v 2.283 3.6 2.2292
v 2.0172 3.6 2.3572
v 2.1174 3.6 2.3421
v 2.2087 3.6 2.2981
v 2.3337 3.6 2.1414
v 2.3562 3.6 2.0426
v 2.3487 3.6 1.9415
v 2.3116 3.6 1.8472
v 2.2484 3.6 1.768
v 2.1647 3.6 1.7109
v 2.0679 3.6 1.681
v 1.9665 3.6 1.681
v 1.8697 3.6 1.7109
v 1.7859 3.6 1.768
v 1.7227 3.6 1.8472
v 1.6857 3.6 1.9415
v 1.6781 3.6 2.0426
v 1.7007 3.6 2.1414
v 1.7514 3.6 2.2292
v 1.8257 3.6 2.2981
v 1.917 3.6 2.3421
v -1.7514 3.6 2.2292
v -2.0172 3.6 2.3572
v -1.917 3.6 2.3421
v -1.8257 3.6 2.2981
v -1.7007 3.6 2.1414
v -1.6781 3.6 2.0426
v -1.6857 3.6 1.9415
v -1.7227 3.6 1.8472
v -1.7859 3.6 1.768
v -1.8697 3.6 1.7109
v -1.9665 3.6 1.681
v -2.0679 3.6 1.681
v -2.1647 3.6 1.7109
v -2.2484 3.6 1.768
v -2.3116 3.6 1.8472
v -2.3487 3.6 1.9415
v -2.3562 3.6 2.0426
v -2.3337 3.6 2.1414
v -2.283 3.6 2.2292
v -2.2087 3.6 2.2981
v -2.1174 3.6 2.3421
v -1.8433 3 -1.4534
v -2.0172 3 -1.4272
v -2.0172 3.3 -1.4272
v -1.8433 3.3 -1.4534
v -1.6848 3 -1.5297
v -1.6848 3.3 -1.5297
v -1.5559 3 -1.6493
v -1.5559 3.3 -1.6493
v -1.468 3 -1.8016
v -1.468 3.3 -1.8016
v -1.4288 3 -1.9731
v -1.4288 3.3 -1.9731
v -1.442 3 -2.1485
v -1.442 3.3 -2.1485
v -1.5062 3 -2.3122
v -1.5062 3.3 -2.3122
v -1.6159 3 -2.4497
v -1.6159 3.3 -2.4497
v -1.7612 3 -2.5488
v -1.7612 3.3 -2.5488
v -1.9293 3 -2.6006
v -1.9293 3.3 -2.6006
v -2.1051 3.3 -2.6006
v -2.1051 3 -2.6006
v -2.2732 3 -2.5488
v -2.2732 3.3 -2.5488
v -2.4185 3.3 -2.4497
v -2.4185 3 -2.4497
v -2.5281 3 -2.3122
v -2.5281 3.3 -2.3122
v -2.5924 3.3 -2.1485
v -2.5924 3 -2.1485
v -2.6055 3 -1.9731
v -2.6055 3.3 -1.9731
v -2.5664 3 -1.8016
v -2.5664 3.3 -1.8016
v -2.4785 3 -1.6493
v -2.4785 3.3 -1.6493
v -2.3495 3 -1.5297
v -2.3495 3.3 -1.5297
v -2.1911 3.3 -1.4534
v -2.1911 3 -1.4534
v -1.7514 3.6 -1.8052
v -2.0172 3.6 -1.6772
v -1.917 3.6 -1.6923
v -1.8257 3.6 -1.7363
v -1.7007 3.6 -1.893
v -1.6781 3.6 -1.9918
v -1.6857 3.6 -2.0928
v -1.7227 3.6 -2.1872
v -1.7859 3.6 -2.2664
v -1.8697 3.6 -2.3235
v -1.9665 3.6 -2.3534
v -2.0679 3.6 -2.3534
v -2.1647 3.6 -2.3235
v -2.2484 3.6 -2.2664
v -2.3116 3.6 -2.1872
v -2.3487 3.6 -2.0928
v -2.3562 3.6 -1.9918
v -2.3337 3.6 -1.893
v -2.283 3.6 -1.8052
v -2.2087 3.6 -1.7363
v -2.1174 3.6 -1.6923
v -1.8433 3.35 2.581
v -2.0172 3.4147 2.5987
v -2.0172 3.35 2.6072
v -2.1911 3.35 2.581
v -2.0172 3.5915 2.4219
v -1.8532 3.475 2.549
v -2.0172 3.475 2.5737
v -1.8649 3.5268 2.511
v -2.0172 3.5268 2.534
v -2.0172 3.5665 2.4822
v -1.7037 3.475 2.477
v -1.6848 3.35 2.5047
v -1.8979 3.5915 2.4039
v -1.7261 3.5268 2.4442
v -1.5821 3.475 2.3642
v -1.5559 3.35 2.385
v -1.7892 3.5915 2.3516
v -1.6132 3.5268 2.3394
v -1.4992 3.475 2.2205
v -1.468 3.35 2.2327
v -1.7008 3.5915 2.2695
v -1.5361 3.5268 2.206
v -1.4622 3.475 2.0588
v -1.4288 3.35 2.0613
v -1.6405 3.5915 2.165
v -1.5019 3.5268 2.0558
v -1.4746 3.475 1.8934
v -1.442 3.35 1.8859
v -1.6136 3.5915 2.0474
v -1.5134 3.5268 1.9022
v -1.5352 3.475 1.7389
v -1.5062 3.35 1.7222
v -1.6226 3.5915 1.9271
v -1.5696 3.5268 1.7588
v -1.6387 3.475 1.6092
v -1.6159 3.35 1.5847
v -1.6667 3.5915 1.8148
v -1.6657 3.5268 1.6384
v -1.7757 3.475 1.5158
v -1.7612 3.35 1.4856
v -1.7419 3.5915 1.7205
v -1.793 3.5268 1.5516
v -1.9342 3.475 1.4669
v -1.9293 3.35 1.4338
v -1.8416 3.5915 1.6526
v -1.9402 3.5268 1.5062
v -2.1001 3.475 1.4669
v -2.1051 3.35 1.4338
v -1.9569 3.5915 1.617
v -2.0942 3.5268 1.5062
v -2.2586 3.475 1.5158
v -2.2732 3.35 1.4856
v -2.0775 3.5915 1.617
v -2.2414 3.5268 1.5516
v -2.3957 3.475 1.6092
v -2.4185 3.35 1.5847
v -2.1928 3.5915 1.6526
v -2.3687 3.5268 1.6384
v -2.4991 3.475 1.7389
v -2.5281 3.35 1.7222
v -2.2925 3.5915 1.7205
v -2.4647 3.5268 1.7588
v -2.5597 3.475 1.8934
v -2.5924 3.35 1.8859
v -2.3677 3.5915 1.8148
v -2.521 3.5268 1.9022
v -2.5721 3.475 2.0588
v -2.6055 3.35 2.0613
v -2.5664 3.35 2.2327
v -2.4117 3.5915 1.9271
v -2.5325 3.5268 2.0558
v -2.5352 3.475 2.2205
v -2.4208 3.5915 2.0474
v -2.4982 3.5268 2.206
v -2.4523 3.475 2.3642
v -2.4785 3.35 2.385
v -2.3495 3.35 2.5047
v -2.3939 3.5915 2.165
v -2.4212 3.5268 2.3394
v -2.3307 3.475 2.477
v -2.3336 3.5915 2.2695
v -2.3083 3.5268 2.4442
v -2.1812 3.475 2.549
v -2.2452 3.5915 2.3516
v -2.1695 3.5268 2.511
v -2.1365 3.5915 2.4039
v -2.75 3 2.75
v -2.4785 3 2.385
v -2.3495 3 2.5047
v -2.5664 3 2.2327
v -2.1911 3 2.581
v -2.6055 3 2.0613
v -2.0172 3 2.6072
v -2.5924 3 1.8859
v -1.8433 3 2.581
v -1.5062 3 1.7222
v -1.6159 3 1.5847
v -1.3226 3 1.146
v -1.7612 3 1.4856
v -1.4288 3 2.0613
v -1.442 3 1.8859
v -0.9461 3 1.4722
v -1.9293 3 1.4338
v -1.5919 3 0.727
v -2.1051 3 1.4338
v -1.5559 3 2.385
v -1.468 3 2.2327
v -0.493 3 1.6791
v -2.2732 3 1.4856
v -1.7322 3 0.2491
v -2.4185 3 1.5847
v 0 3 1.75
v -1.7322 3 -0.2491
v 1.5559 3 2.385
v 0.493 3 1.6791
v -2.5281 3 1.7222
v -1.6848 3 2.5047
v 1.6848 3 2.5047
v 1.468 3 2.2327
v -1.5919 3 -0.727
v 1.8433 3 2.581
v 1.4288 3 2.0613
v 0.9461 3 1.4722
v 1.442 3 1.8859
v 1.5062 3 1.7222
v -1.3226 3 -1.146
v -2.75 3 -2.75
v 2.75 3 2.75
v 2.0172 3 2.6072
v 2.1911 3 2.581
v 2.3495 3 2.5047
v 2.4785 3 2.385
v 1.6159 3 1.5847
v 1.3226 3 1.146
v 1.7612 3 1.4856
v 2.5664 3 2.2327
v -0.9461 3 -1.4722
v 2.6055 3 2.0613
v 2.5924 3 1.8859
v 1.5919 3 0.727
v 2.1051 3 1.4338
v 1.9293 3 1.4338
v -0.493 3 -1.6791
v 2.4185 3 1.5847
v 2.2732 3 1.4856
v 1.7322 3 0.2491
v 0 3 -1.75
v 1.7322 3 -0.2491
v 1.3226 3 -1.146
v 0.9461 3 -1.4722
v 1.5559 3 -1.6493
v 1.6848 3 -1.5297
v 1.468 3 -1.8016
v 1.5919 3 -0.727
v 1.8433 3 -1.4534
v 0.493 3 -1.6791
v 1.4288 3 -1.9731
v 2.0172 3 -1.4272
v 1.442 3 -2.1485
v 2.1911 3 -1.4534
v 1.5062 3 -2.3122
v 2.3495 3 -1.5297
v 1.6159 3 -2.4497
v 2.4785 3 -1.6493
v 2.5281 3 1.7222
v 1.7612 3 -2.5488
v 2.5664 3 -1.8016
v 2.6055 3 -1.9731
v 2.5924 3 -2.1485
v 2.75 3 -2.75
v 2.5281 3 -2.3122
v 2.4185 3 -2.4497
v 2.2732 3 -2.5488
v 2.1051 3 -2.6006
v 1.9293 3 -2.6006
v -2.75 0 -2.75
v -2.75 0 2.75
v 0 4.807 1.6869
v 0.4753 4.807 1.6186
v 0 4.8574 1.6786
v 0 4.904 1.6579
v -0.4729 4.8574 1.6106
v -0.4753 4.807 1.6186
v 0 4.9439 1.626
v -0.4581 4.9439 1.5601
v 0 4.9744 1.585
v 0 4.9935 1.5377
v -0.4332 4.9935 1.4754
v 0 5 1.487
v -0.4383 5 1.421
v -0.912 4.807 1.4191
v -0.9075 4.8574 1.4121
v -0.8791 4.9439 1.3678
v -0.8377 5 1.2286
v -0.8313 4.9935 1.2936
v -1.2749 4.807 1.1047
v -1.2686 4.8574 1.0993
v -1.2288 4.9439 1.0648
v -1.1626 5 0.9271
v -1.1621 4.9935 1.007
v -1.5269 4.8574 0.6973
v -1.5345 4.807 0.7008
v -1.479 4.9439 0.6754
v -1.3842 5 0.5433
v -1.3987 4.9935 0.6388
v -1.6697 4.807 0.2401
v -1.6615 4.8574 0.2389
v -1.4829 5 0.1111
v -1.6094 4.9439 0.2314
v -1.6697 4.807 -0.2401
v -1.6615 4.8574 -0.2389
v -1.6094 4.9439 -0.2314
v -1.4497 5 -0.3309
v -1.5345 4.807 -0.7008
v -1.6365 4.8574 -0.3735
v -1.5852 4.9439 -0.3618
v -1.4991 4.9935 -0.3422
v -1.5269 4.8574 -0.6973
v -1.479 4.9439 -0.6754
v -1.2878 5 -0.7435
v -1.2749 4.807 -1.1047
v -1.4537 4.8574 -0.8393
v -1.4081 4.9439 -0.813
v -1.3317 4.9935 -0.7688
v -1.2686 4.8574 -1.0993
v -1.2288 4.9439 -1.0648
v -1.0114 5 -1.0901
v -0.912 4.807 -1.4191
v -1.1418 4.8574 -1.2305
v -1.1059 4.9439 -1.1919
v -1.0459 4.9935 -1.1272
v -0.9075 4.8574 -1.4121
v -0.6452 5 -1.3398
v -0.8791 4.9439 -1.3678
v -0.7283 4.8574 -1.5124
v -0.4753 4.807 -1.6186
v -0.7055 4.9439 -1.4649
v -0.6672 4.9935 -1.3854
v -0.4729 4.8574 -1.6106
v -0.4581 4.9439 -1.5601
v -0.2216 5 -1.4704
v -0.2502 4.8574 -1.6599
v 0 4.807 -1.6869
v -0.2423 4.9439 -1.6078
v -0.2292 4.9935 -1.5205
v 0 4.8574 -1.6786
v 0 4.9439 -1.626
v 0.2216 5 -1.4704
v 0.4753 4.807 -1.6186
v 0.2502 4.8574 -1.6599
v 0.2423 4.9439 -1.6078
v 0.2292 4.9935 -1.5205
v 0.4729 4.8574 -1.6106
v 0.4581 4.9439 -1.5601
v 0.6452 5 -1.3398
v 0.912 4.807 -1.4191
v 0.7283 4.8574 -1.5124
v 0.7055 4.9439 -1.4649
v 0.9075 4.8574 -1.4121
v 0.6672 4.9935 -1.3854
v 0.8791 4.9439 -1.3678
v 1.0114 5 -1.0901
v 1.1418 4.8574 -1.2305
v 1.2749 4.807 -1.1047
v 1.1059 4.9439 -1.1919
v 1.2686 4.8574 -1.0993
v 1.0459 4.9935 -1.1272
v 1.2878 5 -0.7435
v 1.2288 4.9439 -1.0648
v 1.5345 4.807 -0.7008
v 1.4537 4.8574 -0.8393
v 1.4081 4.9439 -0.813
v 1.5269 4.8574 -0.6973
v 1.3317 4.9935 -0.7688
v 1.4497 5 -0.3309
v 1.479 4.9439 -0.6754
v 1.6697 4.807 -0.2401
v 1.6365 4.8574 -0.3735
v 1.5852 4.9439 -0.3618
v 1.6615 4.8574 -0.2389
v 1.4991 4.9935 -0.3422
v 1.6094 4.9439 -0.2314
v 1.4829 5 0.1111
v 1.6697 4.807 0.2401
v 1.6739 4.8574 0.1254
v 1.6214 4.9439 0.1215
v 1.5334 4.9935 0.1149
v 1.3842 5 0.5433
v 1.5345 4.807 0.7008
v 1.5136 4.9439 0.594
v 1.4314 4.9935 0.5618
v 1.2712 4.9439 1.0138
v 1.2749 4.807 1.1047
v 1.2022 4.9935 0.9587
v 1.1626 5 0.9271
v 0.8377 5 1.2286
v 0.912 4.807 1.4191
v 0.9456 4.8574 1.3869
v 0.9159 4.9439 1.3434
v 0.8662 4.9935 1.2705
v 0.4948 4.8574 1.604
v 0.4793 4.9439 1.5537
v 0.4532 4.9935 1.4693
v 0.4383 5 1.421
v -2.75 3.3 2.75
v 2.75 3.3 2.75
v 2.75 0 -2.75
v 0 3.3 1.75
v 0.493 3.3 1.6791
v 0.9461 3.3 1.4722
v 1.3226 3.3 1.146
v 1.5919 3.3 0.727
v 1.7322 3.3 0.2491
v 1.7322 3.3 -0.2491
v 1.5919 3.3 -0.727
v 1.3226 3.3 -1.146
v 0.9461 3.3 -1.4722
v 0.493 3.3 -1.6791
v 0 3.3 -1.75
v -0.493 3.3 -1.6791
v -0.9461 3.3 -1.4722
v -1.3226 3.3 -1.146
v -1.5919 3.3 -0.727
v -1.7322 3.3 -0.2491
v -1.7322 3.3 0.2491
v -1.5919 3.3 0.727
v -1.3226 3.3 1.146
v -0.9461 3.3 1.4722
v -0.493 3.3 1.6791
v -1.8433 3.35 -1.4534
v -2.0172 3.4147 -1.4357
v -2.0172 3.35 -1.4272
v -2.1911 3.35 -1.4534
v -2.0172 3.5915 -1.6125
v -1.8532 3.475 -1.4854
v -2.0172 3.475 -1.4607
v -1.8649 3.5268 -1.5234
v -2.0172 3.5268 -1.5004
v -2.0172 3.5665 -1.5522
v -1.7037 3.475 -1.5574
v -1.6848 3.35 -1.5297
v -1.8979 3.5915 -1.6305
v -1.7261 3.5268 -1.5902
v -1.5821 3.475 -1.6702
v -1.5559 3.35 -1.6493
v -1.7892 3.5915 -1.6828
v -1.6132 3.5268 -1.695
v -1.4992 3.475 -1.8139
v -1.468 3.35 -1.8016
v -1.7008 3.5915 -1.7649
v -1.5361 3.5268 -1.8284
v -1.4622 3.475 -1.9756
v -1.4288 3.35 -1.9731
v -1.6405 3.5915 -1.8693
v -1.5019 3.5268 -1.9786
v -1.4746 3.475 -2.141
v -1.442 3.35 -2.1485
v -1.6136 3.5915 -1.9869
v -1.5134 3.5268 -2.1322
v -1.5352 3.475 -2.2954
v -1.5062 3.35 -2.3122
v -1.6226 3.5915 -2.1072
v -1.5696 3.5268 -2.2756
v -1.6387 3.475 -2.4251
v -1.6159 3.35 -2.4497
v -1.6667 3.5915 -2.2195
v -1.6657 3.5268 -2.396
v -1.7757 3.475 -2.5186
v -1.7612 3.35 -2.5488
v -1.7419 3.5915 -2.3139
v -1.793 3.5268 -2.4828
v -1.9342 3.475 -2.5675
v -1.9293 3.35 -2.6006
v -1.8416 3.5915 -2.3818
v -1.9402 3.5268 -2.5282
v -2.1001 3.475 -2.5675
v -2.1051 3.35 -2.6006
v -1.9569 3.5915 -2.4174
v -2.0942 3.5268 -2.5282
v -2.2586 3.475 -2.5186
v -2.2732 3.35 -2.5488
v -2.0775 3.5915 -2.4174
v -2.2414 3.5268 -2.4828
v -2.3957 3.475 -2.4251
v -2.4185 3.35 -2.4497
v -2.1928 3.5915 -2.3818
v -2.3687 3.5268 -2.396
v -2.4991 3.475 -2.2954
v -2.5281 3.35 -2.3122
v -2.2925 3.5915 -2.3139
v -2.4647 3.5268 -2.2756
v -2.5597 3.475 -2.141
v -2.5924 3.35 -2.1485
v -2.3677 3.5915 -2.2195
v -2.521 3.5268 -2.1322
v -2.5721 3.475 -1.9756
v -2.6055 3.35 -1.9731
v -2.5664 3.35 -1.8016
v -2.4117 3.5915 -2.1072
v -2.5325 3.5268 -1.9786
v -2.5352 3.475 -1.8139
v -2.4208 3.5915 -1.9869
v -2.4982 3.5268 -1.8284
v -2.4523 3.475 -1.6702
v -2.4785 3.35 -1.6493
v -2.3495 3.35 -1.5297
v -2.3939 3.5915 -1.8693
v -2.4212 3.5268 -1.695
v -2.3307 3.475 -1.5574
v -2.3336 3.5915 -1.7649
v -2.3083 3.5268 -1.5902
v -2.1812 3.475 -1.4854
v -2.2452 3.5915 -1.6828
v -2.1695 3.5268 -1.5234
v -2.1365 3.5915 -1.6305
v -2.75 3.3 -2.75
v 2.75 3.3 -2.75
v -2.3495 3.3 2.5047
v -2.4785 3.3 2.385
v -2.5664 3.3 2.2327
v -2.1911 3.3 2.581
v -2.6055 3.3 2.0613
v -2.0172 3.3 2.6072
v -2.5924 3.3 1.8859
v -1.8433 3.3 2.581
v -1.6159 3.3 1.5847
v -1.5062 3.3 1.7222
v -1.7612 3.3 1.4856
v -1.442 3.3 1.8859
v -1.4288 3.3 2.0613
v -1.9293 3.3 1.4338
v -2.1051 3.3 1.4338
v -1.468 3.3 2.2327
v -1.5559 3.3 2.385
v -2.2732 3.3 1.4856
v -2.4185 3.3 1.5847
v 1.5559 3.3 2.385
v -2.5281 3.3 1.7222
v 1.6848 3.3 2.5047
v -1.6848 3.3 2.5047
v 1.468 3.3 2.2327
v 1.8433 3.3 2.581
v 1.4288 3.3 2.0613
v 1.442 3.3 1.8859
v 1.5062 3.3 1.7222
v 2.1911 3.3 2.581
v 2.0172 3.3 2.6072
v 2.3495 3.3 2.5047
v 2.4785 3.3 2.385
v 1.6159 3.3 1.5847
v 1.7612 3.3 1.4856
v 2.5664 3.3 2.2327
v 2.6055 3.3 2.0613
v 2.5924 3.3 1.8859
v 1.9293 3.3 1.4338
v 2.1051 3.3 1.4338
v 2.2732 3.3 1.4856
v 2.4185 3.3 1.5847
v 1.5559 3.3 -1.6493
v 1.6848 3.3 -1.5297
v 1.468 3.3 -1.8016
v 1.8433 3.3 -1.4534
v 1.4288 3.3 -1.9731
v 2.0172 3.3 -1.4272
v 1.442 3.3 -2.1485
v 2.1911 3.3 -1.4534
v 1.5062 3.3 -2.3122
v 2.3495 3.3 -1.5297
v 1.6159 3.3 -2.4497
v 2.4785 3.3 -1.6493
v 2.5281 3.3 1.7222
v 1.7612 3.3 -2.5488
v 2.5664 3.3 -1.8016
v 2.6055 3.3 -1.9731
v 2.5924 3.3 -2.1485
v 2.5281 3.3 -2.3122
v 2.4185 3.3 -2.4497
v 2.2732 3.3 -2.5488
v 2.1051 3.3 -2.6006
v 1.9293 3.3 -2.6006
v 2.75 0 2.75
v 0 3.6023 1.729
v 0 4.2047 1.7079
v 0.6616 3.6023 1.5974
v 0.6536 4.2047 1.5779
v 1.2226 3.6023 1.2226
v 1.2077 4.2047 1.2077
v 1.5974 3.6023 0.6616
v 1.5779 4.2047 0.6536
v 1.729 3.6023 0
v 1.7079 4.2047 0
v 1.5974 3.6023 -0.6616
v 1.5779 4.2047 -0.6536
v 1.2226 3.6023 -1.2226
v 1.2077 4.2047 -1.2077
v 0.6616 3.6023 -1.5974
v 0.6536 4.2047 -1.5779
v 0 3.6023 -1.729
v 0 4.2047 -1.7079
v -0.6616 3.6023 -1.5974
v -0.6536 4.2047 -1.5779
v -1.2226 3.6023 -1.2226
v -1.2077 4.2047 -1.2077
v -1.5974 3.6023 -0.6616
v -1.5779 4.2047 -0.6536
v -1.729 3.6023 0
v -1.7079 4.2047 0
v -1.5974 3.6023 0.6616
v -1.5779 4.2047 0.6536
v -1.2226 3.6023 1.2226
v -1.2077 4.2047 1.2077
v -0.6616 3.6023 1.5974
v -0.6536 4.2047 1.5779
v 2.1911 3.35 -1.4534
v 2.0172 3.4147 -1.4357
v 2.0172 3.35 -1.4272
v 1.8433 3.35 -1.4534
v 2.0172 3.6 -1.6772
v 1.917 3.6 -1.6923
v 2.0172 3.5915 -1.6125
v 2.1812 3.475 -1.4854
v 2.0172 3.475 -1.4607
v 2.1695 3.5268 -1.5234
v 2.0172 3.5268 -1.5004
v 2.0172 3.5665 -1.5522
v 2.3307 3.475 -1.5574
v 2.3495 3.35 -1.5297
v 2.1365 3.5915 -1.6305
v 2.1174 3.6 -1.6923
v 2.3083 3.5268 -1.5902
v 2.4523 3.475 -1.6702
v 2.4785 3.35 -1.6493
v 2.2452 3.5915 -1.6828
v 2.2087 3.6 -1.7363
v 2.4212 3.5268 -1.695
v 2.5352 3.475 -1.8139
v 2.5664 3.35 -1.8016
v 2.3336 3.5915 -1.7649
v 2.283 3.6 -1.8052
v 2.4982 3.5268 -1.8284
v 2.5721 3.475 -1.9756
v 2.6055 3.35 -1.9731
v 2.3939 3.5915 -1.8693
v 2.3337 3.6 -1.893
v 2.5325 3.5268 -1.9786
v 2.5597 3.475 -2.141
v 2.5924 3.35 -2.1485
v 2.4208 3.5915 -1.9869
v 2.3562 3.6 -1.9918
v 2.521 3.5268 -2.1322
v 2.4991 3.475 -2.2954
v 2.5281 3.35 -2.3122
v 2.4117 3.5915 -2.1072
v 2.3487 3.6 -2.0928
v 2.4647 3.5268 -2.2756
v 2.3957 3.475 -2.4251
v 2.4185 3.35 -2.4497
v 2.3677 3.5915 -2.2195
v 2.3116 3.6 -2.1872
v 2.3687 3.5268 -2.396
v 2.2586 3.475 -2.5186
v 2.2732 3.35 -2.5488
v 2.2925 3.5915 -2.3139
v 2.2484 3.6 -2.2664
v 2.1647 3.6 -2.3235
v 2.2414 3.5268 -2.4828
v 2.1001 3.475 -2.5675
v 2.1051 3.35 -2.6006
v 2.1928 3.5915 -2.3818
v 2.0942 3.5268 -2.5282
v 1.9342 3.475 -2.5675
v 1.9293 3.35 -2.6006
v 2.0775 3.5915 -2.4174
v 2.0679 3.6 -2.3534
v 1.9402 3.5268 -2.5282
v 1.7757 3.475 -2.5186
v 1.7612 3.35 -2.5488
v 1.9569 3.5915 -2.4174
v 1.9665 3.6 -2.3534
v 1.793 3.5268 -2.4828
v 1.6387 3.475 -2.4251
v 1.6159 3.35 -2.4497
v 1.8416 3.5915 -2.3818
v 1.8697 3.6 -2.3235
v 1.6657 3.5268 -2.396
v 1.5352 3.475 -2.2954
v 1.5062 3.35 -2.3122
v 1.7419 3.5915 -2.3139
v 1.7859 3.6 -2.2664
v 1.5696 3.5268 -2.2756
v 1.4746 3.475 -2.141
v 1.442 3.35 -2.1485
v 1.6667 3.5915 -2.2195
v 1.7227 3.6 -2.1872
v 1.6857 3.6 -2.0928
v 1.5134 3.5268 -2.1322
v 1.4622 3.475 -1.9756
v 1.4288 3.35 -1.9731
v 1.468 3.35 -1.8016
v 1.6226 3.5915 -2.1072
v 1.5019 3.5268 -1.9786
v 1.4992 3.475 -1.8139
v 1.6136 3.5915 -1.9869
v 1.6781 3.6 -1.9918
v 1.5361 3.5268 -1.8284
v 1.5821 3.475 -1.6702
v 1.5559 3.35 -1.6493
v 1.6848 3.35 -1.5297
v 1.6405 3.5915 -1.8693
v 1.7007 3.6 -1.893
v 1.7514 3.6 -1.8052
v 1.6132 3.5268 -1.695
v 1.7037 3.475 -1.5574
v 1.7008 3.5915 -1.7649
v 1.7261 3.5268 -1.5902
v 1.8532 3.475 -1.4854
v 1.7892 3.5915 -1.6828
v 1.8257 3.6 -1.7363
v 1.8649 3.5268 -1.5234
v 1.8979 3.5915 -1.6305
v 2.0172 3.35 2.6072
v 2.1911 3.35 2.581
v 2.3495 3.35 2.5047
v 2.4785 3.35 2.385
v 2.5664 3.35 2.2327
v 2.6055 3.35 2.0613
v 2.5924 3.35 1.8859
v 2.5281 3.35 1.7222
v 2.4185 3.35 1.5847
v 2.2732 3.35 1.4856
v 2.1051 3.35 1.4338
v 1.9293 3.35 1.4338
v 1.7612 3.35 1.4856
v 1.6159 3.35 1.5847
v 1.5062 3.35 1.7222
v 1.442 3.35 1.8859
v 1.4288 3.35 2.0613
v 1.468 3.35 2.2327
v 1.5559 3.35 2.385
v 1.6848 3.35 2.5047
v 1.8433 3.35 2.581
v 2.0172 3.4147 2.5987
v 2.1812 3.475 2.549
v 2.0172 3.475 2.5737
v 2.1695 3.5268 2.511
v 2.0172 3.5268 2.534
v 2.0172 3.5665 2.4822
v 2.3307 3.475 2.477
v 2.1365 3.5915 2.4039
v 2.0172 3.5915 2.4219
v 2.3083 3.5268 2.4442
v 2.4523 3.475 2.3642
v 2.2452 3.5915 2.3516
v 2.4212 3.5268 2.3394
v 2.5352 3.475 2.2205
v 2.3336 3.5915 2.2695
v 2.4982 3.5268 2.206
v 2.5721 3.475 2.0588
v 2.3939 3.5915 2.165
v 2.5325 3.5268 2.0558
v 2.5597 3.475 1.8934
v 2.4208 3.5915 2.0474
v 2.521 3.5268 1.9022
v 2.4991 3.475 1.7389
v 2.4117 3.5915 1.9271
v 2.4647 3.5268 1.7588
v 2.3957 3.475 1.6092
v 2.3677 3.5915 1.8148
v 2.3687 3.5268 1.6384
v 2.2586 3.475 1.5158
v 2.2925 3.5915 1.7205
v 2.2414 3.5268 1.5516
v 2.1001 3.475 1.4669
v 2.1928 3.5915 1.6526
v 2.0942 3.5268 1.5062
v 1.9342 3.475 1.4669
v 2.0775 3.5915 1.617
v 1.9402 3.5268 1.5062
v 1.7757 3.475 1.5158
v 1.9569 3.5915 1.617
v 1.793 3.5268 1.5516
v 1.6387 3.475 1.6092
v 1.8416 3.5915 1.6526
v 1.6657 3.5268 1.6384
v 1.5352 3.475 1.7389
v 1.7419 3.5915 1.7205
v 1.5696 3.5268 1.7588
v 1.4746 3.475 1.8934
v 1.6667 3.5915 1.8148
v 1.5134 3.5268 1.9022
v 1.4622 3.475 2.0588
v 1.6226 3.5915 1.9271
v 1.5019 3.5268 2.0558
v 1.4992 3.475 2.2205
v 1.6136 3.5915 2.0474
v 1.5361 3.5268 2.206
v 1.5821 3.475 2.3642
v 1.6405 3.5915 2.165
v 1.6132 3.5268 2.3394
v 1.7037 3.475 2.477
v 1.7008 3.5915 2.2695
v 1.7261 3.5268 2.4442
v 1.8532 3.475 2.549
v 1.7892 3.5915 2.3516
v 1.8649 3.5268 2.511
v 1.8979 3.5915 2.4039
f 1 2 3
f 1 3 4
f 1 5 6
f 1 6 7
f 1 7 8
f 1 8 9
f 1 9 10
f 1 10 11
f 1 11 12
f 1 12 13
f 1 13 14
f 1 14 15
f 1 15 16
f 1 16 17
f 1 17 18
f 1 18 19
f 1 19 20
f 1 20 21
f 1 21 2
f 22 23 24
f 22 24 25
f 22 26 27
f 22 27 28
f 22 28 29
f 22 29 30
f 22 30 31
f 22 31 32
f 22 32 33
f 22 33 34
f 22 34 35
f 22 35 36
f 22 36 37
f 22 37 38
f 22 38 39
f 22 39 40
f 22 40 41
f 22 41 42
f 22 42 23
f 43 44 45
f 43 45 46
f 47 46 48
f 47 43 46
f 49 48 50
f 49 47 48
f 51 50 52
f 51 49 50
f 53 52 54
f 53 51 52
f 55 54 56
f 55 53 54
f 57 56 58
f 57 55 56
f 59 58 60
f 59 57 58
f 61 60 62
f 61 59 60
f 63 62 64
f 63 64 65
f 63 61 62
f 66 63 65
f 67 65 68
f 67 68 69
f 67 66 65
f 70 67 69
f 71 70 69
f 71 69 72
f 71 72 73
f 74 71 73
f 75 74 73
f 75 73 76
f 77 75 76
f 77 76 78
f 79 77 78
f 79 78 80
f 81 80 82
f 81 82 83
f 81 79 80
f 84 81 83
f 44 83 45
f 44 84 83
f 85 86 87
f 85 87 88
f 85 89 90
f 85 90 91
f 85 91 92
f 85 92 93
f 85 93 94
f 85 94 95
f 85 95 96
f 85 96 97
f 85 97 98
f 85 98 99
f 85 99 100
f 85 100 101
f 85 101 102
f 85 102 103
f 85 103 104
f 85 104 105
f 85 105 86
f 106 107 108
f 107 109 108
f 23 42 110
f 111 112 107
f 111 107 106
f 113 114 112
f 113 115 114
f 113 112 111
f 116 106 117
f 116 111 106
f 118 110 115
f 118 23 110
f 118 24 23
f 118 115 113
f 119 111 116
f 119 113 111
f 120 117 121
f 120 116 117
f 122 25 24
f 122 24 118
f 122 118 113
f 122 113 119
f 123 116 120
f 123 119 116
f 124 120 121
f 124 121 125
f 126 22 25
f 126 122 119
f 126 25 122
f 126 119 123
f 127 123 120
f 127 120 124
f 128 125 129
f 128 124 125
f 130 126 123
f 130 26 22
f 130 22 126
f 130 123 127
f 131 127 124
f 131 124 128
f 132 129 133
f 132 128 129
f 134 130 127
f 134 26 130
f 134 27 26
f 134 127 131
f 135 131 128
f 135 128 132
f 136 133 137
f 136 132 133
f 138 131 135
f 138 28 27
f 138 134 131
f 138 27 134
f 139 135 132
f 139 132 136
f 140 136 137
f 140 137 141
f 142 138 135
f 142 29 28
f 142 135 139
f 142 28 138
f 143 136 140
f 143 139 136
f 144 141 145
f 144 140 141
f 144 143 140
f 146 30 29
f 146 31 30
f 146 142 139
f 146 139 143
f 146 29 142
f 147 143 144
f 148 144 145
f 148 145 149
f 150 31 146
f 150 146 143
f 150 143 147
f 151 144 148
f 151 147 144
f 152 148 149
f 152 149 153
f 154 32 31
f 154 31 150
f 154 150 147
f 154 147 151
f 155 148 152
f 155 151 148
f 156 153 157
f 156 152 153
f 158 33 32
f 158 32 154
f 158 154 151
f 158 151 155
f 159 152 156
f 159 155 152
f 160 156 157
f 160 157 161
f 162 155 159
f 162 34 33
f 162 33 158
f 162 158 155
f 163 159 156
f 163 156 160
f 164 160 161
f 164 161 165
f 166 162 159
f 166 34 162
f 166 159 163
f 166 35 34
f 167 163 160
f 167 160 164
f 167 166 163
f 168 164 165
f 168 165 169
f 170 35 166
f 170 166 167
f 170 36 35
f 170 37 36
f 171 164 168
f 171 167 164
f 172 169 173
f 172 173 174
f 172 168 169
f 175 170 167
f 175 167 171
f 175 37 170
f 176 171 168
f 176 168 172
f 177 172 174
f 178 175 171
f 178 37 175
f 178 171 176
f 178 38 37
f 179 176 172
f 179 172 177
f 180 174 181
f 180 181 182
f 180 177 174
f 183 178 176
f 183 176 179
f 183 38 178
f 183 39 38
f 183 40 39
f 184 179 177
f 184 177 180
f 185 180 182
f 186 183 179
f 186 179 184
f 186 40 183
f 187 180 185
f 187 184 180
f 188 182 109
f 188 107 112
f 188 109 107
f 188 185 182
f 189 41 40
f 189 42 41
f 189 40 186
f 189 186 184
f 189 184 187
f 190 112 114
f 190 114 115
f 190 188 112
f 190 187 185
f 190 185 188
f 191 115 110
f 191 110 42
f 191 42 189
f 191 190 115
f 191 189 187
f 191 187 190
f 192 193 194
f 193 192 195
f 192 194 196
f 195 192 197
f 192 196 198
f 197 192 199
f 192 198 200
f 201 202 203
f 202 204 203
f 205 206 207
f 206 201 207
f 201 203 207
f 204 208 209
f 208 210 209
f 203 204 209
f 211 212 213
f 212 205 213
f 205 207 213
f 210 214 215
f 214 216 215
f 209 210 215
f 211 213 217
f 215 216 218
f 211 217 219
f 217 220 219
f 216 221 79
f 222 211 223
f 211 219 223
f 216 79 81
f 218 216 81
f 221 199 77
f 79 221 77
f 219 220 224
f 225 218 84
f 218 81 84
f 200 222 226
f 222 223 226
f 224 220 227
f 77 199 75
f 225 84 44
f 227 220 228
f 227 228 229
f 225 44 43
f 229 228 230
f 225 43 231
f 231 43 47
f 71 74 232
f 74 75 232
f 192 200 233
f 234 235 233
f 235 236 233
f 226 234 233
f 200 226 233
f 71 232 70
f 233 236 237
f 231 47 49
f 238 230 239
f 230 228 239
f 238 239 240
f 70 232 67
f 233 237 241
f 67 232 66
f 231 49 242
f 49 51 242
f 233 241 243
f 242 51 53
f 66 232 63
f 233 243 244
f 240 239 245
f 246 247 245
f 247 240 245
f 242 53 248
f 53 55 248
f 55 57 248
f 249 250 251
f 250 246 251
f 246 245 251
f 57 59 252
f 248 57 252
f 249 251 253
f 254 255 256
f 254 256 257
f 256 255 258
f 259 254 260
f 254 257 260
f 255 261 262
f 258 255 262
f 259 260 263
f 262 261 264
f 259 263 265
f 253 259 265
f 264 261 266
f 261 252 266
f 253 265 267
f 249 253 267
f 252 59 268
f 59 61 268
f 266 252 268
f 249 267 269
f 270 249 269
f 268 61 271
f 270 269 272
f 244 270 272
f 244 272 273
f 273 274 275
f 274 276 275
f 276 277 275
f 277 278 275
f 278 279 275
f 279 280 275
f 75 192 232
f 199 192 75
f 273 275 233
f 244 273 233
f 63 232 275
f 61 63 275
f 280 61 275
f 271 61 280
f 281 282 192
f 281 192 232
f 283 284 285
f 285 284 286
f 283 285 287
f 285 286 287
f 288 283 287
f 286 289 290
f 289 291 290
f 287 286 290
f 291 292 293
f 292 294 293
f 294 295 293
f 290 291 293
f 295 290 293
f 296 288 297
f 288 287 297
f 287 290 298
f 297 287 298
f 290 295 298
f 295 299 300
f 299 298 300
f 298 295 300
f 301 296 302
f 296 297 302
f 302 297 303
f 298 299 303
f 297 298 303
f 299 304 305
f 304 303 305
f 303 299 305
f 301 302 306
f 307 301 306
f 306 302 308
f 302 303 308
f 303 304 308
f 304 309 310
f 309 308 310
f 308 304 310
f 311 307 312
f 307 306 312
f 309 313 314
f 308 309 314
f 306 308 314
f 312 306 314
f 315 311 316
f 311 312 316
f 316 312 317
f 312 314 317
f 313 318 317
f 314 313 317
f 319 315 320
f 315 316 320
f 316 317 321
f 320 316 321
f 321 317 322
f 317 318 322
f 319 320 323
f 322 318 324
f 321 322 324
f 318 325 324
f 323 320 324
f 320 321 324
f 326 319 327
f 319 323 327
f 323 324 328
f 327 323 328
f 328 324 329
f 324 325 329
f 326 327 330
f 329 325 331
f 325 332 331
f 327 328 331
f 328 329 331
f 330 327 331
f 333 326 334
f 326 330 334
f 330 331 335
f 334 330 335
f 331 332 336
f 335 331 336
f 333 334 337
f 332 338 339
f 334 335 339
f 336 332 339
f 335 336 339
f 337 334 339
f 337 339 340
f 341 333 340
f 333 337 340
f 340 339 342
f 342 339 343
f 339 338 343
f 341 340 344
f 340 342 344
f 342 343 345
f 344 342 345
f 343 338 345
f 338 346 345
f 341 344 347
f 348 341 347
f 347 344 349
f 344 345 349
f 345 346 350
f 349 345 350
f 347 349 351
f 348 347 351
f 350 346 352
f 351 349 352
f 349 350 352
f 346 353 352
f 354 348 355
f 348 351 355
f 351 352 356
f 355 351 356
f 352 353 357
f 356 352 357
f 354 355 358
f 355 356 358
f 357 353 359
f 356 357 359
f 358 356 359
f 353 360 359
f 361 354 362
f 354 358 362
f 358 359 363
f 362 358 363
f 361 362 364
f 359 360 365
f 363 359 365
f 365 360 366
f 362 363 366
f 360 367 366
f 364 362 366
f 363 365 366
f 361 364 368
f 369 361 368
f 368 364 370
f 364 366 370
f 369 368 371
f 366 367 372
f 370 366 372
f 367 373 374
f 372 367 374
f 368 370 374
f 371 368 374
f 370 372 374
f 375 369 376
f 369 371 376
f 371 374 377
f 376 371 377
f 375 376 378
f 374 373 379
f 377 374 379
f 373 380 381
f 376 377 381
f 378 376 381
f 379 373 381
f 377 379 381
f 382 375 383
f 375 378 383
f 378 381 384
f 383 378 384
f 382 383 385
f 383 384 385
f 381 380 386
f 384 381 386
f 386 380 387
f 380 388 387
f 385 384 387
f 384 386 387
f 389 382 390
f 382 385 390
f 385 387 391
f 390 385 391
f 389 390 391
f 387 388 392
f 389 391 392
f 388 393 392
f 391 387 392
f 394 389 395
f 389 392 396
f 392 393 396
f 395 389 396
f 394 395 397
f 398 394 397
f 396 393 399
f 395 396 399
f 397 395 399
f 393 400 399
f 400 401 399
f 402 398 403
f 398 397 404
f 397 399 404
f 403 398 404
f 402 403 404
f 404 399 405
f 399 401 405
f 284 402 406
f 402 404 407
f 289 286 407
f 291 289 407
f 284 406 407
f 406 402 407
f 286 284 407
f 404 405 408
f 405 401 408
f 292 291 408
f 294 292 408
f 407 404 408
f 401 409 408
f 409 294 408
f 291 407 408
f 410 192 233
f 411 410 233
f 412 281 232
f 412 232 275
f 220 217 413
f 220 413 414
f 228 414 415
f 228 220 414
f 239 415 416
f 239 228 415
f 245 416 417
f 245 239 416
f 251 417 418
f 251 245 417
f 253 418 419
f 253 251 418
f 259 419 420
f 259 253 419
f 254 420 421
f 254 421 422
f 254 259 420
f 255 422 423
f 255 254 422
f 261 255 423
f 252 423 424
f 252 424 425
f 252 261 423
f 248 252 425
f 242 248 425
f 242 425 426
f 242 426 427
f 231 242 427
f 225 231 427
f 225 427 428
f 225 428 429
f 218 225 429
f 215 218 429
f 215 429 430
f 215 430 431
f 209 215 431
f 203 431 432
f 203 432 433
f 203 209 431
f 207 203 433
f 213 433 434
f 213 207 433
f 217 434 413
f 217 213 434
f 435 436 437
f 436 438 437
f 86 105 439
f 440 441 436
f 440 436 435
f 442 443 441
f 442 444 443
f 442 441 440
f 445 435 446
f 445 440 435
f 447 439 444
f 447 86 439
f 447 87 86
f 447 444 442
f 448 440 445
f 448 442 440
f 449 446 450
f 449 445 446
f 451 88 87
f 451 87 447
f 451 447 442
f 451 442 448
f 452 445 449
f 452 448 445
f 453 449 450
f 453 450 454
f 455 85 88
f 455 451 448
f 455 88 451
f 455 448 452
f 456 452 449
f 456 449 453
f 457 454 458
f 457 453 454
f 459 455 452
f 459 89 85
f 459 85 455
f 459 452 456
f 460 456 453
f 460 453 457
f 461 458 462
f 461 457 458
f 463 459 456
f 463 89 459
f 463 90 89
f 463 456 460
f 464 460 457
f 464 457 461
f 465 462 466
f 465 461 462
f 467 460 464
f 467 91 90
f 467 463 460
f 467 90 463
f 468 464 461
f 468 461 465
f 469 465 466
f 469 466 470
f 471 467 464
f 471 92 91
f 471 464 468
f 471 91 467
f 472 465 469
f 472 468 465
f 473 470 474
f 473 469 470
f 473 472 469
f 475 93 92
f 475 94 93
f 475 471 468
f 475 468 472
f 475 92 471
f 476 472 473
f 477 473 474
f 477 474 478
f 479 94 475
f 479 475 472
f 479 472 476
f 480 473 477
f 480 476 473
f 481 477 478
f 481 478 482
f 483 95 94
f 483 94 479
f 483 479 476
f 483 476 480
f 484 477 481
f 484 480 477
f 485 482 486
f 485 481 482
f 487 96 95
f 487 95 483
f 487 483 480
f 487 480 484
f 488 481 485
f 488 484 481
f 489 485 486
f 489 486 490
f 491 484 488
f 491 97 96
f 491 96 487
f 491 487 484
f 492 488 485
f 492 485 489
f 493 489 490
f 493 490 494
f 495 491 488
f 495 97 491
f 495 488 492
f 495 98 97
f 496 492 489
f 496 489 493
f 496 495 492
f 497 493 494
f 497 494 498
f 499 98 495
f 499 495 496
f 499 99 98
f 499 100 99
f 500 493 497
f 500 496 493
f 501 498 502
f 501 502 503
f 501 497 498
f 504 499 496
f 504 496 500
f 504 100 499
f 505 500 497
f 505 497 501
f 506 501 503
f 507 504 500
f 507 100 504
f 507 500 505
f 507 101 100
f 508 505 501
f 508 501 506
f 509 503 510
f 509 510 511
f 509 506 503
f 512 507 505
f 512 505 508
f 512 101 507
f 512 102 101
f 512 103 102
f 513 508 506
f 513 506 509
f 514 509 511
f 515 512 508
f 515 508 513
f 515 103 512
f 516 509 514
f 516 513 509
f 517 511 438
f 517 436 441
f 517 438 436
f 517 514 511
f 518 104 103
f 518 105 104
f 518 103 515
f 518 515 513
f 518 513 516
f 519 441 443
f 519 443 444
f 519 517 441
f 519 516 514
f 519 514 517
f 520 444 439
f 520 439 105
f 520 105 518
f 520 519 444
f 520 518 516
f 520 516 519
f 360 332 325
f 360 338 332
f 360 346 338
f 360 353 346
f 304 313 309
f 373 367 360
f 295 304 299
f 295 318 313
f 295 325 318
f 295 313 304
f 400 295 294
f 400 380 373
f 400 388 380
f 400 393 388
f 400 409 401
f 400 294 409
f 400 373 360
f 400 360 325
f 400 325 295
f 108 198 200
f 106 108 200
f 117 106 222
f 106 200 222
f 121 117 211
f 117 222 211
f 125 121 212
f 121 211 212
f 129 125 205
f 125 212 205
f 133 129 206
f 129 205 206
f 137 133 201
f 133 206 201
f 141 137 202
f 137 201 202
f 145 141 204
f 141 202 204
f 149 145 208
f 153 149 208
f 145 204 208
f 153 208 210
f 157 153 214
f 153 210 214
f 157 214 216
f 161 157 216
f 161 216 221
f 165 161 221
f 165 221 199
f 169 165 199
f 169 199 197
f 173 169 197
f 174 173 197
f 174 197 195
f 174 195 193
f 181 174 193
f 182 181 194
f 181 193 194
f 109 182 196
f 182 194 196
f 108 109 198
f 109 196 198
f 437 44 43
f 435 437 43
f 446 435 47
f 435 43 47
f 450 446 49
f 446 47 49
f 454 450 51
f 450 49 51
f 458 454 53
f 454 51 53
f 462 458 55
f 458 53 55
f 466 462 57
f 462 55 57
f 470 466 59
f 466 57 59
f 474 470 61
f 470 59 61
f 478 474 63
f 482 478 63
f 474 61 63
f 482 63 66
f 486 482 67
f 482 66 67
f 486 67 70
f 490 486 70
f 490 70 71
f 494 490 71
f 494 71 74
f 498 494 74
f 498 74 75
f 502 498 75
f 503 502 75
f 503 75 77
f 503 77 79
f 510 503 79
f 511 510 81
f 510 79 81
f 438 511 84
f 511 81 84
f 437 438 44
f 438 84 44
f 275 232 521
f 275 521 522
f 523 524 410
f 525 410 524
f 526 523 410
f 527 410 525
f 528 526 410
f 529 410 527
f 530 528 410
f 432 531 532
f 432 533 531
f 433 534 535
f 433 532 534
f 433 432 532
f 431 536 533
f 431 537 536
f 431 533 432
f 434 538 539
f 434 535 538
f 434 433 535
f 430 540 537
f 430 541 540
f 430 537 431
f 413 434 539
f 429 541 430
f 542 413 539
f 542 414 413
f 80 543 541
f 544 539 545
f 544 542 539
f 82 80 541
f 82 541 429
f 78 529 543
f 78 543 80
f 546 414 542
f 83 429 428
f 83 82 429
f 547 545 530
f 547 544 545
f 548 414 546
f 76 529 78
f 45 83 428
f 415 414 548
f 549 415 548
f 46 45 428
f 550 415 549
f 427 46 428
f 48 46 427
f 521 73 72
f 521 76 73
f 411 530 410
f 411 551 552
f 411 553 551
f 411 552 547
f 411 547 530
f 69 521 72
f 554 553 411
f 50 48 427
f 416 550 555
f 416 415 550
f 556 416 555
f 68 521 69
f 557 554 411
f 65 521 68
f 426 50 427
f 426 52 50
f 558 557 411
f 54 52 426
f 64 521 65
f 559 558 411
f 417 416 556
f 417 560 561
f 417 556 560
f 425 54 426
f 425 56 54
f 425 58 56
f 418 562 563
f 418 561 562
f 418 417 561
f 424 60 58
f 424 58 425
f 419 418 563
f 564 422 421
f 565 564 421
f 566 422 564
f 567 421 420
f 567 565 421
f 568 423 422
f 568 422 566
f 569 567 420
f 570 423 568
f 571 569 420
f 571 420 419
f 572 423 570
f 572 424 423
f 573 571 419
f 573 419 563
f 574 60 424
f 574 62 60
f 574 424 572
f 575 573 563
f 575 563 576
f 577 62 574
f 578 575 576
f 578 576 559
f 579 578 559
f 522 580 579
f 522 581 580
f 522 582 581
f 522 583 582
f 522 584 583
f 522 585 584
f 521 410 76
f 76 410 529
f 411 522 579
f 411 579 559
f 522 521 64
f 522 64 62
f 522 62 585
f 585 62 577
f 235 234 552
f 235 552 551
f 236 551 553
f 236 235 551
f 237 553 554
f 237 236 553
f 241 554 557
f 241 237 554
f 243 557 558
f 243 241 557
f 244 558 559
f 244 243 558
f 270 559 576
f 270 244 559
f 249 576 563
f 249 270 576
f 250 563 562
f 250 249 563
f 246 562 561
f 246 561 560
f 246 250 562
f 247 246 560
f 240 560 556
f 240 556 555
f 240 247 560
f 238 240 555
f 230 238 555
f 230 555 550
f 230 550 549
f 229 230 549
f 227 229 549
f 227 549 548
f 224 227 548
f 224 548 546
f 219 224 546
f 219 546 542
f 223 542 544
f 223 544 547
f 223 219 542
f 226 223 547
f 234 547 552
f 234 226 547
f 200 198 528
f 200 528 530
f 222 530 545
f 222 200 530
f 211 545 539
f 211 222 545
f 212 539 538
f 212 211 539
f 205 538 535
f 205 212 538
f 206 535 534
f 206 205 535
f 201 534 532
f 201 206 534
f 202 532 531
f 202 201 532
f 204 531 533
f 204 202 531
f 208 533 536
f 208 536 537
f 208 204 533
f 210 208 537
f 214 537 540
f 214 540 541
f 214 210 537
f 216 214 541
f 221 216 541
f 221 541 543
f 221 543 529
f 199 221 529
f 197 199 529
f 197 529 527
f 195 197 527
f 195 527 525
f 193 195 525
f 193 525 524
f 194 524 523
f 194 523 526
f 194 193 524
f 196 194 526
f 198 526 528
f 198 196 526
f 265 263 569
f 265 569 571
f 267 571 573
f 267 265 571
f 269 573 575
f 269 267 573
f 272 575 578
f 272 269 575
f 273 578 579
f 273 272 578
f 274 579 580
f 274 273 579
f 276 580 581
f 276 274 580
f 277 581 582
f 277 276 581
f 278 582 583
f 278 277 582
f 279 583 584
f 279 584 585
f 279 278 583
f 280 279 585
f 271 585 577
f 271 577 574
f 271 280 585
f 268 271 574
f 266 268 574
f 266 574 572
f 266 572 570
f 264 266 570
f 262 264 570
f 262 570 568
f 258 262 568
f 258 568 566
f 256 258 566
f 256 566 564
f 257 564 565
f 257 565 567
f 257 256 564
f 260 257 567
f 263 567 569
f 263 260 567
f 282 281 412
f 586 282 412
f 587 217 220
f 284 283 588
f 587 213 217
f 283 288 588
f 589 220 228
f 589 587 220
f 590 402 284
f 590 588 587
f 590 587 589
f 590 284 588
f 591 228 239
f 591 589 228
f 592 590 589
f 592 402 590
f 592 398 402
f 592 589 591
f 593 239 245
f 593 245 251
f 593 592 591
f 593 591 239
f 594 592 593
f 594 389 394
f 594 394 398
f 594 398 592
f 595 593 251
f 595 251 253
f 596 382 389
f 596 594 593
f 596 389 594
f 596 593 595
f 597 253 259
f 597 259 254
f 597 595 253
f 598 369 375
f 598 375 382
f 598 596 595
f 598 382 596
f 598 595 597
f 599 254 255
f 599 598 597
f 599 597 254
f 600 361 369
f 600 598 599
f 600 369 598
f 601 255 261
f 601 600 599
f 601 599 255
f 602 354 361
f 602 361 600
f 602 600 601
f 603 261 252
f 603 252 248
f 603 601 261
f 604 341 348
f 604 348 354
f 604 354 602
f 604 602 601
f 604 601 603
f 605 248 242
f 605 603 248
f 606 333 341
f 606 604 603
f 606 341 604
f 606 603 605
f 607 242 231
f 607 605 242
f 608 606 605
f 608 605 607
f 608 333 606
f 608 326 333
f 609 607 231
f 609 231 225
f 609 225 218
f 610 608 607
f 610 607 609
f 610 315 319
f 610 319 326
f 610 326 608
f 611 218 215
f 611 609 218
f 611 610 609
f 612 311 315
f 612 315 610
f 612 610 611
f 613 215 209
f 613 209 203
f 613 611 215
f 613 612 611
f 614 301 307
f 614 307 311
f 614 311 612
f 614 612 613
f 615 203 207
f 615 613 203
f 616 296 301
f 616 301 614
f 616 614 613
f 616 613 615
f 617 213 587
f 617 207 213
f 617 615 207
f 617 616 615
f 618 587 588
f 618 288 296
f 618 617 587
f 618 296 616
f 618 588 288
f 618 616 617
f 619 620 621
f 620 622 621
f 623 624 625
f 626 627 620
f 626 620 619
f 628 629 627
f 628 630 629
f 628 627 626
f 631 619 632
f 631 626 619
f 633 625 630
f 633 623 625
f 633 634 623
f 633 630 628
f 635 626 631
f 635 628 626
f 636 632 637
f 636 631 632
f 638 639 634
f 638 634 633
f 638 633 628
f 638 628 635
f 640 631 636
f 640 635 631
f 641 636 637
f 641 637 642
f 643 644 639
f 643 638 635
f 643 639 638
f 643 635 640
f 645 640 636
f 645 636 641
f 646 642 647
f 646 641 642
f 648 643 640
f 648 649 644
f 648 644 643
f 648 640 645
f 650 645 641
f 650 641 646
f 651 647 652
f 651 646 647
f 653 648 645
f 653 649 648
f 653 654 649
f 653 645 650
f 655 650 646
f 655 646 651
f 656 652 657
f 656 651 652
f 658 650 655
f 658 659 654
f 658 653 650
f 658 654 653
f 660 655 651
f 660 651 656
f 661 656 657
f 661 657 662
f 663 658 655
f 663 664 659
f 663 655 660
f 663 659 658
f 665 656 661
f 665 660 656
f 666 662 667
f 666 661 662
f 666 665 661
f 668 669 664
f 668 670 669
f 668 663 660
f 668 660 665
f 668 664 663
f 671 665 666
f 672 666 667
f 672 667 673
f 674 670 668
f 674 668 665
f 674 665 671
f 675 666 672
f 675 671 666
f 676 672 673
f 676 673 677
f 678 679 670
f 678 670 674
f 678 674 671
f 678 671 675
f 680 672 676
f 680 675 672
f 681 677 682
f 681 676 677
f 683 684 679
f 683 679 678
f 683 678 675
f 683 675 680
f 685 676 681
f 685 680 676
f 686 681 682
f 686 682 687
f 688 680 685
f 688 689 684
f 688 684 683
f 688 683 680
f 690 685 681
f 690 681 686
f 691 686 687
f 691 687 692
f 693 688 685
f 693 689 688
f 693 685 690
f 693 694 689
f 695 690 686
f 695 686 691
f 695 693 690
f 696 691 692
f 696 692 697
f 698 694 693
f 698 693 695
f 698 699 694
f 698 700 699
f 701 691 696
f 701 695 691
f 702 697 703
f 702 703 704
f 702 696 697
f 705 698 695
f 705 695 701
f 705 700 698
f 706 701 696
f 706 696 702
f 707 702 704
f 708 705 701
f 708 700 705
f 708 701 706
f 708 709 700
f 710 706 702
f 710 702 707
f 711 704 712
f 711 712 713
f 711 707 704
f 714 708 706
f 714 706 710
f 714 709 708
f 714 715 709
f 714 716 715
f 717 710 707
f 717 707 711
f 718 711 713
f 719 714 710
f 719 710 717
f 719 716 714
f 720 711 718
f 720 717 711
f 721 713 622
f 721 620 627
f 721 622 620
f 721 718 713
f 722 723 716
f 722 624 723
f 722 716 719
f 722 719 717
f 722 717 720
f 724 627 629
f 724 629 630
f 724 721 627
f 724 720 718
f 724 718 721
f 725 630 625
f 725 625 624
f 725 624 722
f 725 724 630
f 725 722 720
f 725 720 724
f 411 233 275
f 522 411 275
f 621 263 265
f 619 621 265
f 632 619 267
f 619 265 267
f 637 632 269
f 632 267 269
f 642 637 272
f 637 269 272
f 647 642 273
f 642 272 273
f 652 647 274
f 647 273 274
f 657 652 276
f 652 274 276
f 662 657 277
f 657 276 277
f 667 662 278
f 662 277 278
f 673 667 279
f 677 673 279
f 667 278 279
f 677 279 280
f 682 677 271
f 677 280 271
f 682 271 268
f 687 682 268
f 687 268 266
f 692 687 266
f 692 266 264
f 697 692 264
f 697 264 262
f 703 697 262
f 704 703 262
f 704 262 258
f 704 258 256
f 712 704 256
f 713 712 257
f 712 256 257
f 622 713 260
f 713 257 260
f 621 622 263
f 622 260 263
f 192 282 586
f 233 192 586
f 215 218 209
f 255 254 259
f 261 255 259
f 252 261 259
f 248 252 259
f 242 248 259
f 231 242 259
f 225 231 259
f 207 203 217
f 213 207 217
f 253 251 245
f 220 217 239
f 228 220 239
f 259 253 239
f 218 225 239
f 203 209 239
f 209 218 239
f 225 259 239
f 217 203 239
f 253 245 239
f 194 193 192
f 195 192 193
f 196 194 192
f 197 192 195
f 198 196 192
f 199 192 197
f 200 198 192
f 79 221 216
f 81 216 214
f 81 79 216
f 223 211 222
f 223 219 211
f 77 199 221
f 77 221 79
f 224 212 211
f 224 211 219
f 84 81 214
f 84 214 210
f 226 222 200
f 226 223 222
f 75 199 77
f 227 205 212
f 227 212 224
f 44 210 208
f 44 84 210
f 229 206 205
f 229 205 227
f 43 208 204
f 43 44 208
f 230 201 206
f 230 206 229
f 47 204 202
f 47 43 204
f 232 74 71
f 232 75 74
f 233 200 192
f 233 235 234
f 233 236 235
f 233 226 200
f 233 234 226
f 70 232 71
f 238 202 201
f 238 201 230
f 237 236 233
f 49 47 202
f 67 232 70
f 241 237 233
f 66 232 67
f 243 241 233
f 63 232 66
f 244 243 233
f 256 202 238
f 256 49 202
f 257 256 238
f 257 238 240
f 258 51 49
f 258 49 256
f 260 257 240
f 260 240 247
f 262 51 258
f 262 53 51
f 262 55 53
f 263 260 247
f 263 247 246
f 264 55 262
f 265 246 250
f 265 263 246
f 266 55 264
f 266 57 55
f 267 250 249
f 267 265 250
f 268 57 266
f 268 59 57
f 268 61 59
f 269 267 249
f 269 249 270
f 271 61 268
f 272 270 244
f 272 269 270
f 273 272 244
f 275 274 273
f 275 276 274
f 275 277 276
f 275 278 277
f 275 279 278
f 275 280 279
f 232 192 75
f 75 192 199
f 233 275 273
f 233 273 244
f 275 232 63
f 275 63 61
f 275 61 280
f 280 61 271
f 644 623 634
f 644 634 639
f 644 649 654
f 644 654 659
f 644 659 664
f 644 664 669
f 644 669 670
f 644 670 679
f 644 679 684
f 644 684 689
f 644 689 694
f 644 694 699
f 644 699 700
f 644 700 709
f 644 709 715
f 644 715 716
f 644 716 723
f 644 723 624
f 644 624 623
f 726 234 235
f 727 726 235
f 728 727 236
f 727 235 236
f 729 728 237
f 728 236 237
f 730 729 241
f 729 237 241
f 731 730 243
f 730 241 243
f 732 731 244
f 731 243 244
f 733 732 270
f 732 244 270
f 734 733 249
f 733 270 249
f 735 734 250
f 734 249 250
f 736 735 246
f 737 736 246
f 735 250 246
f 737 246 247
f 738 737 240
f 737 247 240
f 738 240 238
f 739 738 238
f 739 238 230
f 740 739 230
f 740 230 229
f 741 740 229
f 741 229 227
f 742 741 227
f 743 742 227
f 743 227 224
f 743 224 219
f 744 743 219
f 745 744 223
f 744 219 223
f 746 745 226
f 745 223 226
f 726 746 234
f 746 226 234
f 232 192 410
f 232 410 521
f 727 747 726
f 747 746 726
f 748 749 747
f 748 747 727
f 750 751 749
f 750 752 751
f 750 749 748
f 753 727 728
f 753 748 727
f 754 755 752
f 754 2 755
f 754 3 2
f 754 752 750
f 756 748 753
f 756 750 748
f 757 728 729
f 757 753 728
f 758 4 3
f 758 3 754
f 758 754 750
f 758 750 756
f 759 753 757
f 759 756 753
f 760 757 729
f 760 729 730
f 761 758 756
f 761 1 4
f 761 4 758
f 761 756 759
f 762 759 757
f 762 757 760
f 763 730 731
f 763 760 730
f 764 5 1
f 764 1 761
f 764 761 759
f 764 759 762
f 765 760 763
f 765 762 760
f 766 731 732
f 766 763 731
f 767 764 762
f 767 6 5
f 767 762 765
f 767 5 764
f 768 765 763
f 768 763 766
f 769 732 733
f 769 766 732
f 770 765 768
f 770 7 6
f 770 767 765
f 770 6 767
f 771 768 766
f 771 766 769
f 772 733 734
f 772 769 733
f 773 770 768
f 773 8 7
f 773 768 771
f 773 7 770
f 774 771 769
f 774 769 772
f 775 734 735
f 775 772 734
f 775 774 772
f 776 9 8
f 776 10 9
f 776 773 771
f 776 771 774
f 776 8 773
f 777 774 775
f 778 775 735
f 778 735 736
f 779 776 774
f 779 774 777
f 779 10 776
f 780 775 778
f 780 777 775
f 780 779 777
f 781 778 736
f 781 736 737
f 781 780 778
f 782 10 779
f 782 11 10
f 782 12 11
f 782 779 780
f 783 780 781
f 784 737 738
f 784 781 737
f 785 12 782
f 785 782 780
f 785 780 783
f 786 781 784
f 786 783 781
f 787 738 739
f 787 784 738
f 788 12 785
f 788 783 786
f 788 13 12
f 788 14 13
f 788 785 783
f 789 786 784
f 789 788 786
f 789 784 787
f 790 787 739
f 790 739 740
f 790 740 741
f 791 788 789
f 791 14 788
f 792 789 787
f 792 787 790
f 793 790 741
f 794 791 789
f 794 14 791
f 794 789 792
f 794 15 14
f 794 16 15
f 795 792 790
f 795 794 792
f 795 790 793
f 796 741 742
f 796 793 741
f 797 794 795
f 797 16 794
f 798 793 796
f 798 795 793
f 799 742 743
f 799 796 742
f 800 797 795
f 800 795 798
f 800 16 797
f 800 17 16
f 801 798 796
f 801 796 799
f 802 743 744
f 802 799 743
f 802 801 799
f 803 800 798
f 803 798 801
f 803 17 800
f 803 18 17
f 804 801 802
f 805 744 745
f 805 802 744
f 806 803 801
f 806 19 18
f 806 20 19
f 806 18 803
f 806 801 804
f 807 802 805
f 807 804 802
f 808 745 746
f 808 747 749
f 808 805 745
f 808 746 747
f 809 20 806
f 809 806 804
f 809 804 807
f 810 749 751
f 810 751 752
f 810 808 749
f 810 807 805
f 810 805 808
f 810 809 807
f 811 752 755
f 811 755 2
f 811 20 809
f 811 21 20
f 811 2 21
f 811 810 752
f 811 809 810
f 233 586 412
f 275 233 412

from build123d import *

# Parameters (mm, degrees)
SKETCH1_W           = 5.5
SKETCH1_H           = 5.5
BOSS_EXTRUDE1_DEPTH = 3
SKETCH2_W           = 5.5
SKETCH2_H           = 5.5
SKETCH2_R           = 1.75
SKETCH2_R_2         = 0.59
BOSS_EXTRUDE2_DEPTH = 0.3
SKETCH2_2_R         = 0.59
BOSS_EXTRUDE3_DEPTH = 0.6
SKETCH2_3_R         = 1.75
BOSS_EXTRUDE4_DEPTH = 2
BOSS_EXTRUDE4_TAPER = 2
FILLET1_R           = 0.25
FILLET2_R           = 0.2


with BuildPart() as part:
    # Sketch1 → Boss-Extrude1 (new body)
    with BuildSketch(Plane(origin=(0, 0, 0), x_dir=(1, 0, 0), z_dir=(0, 1, 0))):
        Rectangle(SKETCH1_W, SKETCH1_H)
    extrude(amount=BOSS_EXTRUDE1_DEPTH)

    # Sketch2<2> → Boss-Extrude3 (add)
    with BuildSketch(Plane(origin=(0, 3, 0), x_dir=(1, 0, 0), z_dir=(0, 1, 0))):
        with Locations((-2.017190272, 2.017190272)):
            Circle(SKETCH2_2_R)
        with Locations((2.017190272, 2.017190272)):
            Circle(SKETCH2_2_R)
        with Locations((2.017190272, -2.017190272)):
            Circle(SKETCH2_2_R)
        with Locations((-2.017190272, -2.017190272)):
            Circle(SKETCH2_2_R)
    extrude(amount=BOSS_EXTRUDE3_DEPTH)

    # Fillet1
    fillet1_edges = [part.edges().sort_by_distance(p)[0] for p in [
        (1.427190272, 3.6, -2.017190272),
        (1.427190272, 3.6, 2.017190272),
        (-2.607190272, 3.6, 2.017190272),
        (-2.607190272, 3.6, -2.017190272),
    ]]
    fillet(fillet1_edges, radius=FILLET1_R)


with BuildPart() as body_2:
    # Sketch2 → Boss-Extrude2 (new body)
    with BuildSketch(Plane(origin=(0, 3, 0), x_dir=(1, 0, 0), z_dir=(0, 1, 0))):
        Rectangle(SKETCH2_W, SKETCH2_H)
        Circle(SKETCH2_R, mode=Mode.SUBTRACT)
        with Locations((-2.017190272, 2.017190272)):
            Circle(SKETCH2_R_2, mode=Mode.SUBTRACT)
        with Locations((2.017190272, 2.017190272)):
            Circle(SKETCH2_R_2, mode=Mode.SUBTRACT)
        with Locations((2.017190272, -2.017190272)):
            Circle(SKETCH2_R_2, mode=Mode.SUBTRACT)
        with Locations((-2.017190272, -2.017190272)):
            Circle(SKETCH2_R_2, mode=Mode.SUBTRACT)
    extrude(amount=BOSS_EXTRUDE2_DEPTH)


with BuildPart() as body_3:
    # Sketch2<3> → Boss-Extrude4 (new body)
    with BuildSketch(Plane(origin=(0, 3, 0), x_dir=(1, 0, 0), z_dir=(0, 1, 0))):
        Circle(SKETCH2_3_R)
    extrude(amount=BOSS_EXTRUDE4_DEPTH, taper=BOSS_EXTRUDE4_TAPER)

    # Fillet2
    fillet2_edges = [body_3.edges().sort_by_distance(p)[0] for p in [
        (-1.680158461, 5, 0),
    ]]
    fillet(fillet2_edges, radius=FILLET2_R)


solid = Compound([part.part, body_2.part, body_3.part])
